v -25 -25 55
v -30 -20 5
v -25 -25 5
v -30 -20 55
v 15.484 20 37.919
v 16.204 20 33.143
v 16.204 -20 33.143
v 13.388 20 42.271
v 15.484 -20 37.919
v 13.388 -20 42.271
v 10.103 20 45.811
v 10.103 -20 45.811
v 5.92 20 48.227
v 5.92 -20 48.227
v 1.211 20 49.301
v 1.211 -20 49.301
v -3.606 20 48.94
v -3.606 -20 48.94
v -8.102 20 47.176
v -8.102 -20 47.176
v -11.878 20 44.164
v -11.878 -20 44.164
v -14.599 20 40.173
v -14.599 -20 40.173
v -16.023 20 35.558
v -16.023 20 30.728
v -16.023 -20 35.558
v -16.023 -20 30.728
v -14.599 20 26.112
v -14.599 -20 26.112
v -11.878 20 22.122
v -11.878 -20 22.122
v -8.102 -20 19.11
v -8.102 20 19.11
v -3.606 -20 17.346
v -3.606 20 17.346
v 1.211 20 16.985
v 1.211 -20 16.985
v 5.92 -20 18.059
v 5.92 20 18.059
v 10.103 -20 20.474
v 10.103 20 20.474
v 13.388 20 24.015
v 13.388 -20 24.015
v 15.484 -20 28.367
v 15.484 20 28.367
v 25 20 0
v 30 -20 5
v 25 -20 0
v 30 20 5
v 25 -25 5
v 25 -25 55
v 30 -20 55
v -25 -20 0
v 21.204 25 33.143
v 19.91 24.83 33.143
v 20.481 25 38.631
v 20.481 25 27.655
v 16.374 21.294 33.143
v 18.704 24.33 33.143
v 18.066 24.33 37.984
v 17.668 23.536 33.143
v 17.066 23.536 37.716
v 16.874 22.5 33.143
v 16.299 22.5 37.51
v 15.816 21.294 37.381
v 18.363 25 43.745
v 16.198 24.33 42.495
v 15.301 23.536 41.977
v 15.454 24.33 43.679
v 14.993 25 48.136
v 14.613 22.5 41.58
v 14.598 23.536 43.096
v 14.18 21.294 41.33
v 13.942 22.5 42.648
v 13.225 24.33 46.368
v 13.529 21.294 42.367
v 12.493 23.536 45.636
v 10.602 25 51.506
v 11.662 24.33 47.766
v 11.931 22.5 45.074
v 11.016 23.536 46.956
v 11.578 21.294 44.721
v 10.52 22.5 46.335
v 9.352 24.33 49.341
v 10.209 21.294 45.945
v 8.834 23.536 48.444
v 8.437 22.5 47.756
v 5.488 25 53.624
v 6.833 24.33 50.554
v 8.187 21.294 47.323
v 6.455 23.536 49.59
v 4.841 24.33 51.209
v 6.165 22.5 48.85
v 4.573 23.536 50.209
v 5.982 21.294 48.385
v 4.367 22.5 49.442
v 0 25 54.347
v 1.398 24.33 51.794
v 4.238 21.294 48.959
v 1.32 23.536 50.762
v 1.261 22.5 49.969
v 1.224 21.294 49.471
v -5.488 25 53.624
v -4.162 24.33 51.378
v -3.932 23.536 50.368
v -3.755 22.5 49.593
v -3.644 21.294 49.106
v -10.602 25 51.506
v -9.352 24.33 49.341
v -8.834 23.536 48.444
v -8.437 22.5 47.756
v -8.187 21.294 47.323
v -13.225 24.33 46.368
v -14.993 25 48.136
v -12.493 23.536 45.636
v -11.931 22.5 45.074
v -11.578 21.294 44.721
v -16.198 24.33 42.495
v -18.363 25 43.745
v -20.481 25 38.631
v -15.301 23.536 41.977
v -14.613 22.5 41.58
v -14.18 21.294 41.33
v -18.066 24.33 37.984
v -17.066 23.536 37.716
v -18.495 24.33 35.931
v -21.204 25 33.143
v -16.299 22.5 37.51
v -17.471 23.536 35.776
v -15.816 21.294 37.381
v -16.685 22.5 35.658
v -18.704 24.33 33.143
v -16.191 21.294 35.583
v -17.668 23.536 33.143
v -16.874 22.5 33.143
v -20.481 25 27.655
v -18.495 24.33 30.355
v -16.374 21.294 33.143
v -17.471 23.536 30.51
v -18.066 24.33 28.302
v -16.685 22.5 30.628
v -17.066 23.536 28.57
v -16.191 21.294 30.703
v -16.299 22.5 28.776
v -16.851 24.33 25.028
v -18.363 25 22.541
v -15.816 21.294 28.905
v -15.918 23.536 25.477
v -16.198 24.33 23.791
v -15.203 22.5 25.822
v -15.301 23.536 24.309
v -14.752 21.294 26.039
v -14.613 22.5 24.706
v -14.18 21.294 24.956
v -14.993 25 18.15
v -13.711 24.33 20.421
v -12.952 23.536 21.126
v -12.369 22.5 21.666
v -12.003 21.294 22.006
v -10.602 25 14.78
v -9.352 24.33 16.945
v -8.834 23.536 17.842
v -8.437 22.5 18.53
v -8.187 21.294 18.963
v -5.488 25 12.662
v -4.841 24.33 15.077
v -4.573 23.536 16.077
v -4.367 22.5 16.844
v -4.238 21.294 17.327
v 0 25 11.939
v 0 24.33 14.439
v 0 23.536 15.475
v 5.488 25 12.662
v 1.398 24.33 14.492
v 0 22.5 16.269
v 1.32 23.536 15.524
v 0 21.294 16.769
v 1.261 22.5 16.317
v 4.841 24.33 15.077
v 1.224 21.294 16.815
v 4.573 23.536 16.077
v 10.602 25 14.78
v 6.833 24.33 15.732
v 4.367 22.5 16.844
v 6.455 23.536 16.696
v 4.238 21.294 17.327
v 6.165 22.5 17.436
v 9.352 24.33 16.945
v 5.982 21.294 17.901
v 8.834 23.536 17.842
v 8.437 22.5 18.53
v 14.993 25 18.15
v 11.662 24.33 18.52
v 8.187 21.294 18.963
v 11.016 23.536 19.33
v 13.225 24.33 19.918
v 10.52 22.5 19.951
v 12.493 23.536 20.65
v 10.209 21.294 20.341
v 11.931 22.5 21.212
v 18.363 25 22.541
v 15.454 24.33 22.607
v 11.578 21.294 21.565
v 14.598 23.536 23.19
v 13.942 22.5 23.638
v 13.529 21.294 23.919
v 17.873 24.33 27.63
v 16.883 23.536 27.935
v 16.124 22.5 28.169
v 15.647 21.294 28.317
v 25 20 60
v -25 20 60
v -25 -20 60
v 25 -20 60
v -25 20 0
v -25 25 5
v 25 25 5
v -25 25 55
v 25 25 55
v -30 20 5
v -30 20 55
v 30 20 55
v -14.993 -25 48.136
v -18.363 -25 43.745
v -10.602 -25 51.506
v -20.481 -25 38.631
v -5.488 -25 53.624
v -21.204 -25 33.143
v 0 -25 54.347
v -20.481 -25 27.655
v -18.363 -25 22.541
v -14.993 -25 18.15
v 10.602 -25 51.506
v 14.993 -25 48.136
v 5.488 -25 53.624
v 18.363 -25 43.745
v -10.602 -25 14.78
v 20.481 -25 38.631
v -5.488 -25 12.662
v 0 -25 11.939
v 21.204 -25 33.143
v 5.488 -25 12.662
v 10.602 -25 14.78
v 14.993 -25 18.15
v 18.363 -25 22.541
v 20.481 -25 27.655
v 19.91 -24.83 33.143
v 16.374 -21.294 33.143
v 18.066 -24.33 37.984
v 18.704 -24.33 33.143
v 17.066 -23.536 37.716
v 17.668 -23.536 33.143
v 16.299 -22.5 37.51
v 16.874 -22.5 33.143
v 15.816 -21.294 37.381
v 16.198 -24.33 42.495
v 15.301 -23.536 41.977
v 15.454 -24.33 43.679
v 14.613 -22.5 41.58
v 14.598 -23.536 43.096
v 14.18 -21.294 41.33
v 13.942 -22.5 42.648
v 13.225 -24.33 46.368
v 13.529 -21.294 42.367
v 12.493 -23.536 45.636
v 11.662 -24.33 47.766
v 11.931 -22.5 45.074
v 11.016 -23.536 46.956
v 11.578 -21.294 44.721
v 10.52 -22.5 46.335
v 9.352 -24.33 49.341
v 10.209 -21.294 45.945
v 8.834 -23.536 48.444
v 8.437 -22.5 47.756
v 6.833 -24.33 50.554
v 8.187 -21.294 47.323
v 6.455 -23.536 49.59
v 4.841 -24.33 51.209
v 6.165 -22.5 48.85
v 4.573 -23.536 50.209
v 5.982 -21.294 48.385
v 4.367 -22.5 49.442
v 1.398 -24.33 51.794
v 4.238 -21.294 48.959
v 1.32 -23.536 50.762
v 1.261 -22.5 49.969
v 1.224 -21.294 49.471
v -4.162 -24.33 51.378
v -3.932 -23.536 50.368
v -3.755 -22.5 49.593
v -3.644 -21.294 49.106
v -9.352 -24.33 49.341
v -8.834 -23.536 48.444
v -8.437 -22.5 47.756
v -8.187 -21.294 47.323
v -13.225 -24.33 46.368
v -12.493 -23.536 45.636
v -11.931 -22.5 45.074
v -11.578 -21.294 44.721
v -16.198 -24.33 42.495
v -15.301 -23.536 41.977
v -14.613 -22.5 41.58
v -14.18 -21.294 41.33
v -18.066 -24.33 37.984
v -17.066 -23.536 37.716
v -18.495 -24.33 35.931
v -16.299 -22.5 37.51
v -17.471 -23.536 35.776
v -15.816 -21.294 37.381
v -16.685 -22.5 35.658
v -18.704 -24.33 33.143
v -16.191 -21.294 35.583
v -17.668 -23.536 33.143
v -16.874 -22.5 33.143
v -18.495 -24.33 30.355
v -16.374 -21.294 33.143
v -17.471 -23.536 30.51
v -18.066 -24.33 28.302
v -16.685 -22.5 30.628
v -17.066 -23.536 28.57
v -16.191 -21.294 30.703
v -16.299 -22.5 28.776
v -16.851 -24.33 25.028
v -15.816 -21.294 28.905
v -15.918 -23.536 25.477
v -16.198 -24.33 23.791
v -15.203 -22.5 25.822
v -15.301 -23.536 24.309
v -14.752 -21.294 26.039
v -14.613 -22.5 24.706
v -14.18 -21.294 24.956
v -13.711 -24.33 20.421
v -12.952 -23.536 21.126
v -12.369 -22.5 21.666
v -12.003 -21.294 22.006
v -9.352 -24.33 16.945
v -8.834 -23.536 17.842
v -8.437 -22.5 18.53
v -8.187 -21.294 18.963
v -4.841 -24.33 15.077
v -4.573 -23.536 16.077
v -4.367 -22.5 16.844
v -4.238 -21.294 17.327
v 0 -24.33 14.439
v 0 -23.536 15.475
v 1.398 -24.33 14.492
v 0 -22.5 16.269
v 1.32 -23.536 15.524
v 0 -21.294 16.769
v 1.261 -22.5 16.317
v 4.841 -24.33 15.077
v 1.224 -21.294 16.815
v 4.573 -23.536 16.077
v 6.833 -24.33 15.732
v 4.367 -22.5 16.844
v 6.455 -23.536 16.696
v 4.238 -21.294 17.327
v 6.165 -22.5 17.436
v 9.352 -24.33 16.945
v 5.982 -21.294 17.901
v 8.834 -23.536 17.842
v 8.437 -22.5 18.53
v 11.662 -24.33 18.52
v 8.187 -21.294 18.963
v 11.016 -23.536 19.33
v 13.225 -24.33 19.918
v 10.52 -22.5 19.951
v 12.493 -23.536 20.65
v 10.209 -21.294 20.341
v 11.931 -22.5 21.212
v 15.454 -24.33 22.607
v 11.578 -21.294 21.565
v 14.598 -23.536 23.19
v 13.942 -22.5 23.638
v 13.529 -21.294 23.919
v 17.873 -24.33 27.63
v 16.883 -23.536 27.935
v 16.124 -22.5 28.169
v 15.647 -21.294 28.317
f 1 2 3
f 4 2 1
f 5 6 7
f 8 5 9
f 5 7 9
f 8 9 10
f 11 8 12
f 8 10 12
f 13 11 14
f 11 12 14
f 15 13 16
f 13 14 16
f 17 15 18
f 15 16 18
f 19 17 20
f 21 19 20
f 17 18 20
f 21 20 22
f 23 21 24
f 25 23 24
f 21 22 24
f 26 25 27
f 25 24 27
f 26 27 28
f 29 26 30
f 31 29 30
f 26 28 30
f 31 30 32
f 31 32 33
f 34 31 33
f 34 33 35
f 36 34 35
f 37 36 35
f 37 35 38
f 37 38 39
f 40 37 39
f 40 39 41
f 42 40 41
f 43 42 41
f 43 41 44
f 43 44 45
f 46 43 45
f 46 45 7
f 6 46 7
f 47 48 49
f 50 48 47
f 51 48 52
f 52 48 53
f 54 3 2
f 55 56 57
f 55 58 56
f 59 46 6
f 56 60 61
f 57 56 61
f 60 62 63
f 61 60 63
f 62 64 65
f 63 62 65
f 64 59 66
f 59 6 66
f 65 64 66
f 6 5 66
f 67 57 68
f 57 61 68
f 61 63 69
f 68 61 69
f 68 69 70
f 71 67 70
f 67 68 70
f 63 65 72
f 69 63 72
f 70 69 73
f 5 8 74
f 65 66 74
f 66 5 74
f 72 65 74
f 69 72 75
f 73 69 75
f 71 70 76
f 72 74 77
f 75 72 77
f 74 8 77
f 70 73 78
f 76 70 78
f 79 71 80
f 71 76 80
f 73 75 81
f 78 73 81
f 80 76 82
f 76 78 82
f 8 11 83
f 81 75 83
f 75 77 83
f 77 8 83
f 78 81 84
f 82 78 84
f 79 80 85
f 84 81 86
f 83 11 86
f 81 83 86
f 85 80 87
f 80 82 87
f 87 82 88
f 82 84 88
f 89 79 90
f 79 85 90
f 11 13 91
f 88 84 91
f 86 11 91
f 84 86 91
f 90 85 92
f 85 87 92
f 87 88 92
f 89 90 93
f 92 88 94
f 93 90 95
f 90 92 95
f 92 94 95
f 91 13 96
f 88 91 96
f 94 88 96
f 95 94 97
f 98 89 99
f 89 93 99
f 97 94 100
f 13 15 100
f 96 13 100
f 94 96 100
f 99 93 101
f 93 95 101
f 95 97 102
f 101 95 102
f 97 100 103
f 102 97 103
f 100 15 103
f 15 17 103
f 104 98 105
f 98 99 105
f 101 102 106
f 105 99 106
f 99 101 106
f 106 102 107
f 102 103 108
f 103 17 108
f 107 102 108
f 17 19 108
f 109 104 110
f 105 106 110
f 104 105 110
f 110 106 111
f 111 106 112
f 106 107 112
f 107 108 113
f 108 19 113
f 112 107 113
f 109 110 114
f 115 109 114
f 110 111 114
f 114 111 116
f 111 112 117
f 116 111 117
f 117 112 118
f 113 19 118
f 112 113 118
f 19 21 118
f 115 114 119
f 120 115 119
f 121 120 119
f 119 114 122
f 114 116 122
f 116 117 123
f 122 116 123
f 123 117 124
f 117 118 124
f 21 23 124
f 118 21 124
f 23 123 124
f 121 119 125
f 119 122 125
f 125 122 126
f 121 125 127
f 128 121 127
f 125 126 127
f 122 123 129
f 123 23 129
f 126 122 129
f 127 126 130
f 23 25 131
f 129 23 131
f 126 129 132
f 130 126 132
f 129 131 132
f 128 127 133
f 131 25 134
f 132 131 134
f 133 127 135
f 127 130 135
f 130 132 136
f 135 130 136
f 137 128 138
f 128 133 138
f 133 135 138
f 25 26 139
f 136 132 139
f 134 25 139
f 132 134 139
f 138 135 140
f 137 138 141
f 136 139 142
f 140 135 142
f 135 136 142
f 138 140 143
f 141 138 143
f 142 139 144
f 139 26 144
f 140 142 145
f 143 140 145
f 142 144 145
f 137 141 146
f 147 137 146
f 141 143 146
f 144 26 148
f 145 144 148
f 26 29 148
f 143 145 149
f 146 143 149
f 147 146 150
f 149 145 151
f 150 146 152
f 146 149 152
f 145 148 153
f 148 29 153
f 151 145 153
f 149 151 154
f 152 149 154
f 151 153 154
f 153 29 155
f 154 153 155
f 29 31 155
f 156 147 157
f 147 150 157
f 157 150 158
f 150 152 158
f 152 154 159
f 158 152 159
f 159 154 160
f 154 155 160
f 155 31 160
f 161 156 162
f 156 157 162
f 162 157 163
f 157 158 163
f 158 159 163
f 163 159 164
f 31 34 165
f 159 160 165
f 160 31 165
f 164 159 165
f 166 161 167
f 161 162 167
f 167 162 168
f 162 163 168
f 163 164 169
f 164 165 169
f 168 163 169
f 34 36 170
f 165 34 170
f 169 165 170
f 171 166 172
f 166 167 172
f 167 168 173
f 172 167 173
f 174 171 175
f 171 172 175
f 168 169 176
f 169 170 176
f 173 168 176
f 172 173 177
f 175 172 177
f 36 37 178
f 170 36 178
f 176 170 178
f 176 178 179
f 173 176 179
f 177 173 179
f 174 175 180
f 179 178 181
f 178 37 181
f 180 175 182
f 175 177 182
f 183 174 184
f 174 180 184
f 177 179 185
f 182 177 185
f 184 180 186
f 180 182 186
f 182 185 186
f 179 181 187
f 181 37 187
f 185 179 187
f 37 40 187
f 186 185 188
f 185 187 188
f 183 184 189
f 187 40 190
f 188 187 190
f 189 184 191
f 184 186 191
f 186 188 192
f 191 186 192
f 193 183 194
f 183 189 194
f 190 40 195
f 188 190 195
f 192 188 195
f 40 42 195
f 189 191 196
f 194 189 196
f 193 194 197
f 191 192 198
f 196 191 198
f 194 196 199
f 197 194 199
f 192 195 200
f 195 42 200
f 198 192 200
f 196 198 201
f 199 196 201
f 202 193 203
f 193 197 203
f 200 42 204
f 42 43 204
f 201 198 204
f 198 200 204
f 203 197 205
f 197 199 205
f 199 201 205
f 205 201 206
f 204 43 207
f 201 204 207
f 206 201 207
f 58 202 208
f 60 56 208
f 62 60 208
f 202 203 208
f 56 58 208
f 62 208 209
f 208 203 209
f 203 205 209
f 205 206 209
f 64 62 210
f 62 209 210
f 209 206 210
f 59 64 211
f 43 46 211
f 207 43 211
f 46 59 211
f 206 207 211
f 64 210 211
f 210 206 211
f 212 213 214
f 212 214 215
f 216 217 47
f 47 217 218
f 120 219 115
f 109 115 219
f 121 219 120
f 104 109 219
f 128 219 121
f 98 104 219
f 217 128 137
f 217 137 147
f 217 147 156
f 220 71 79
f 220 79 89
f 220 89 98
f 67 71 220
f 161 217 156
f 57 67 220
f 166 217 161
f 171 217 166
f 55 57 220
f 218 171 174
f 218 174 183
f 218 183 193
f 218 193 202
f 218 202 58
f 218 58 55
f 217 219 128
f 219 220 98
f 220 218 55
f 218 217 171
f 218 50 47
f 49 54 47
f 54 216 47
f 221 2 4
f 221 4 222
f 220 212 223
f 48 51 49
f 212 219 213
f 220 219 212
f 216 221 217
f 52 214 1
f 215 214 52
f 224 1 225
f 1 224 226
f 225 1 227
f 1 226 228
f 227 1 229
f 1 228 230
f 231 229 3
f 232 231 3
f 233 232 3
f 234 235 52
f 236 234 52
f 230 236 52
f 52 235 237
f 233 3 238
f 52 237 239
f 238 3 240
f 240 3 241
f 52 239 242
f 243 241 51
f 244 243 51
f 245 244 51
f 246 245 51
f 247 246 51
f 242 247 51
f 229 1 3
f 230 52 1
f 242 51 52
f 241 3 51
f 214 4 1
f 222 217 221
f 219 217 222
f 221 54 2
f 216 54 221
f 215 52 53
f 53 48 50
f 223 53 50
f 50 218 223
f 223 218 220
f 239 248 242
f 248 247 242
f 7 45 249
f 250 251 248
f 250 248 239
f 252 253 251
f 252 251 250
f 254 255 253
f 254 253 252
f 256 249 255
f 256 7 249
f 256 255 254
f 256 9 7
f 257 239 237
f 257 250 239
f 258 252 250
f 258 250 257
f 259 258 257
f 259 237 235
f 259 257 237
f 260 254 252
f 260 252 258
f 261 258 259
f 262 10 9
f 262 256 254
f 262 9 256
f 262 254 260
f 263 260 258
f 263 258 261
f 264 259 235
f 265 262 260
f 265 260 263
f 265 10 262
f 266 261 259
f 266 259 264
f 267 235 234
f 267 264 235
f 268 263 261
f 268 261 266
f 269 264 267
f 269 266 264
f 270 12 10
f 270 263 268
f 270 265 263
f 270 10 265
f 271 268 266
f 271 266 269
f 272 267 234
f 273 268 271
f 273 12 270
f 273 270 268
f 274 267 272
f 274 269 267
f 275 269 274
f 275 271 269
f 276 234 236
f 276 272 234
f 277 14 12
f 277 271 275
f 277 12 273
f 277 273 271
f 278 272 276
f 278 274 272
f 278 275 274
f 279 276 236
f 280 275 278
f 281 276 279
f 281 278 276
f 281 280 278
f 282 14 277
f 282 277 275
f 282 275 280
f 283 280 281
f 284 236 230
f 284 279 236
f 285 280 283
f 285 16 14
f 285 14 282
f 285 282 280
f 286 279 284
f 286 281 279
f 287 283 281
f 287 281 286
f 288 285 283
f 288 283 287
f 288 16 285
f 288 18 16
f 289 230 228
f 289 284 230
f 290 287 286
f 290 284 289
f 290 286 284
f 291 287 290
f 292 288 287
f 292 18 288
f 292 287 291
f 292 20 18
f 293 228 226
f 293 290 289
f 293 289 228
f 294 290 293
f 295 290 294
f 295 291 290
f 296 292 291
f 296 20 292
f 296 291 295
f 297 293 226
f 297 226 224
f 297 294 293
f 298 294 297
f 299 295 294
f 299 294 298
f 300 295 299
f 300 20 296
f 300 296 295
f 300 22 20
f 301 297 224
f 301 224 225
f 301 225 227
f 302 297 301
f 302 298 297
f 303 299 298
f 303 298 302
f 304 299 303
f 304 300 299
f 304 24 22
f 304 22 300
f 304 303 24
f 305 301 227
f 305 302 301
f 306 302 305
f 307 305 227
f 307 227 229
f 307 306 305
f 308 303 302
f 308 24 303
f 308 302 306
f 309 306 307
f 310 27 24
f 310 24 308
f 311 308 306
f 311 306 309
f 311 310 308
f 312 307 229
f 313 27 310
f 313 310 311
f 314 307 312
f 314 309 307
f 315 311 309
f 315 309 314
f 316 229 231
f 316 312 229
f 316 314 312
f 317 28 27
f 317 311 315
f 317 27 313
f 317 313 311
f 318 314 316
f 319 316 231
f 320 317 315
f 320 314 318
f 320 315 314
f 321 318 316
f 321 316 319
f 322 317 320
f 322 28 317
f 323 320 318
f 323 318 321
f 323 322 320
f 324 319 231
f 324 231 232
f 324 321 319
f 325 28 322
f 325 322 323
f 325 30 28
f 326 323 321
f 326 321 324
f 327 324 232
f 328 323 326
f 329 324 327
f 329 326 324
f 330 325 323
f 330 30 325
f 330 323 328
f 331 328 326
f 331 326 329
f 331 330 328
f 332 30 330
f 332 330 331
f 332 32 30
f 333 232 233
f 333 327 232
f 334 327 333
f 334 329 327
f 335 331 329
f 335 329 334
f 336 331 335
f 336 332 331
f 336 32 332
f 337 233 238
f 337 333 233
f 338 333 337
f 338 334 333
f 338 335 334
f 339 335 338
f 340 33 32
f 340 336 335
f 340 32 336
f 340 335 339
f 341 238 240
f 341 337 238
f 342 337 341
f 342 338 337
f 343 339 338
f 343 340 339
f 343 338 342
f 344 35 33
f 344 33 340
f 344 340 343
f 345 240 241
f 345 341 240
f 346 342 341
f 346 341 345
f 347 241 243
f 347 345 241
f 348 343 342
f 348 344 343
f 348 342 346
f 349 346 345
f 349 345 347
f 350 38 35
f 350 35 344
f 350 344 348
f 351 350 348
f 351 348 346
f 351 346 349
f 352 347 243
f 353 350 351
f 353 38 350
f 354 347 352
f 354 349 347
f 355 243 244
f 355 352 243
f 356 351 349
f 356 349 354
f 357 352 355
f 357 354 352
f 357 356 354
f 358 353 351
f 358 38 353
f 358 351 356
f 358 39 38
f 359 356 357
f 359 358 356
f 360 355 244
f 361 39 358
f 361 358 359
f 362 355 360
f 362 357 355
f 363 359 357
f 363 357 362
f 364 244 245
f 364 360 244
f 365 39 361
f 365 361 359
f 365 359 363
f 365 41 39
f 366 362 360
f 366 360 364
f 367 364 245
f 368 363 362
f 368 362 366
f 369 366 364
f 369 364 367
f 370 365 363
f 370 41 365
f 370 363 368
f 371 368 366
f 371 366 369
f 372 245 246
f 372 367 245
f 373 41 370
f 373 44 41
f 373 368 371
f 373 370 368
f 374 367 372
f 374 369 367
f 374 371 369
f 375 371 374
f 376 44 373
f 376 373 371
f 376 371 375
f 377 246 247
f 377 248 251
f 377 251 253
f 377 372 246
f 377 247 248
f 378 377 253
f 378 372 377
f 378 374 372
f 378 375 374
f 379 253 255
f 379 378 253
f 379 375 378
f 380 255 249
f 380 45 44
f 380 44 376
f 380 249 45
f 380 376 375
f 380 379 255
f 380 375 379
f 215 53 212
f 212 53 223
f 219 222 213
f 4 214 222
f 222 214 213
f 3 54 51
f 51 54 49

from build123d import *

# Parameters (mm, degrees)
F0_W     = 60
F0_H     = 50
F1_DEPTH = 60
F2_R     = 16.203635
F3_DEPTH = 50.001
F4_R     = 5
F5_SIZE  = 5


with BuildPart() as f1:
    # F0 (on Top) → F1 (new body)
    with BuildSketch(Plane.XY):
        Rectangle(F0_W, F0_H)
    extrude(amount=F1_DEPTH)

    # F2 (on face) → F3 (cut, through all)
    with BuildSketch(Plane.XZ.offset(25)):
        with Locations((0, 33.142988)):
            Circle(F2_R)
    extrude(amount=-F3_DEPTH, mode=Mode.SUBTRACT)

    # F4
    f4_edges = [f1.edges().sort_by_distance(p)[0] for p in [
        (-16.203635, -25, 33.142988),
        (-16.203635, 25, 33.142988),
    ]]
    fillet(f4_edges, radius=F4_R)

    # F5
    f5_edges = [f1.edges().sort_by_distance(p)[0] for p in [
        (-30, 25, 30),
        (-30, -25, 30),
        (-30, 0, 60),
        (0, 25, 60),
        (0, -25, 60),
        (0, -25, 0),
        (-30, 0, 0),
        (30, -25, 30),
        (30, 0, 60),
        (30, 25, 30),
        (30, 0, 0),
        (0, 25, 0),
    ]]
    chamfer(f5_edges, length=F5_SIZE)


solid = f1.part
